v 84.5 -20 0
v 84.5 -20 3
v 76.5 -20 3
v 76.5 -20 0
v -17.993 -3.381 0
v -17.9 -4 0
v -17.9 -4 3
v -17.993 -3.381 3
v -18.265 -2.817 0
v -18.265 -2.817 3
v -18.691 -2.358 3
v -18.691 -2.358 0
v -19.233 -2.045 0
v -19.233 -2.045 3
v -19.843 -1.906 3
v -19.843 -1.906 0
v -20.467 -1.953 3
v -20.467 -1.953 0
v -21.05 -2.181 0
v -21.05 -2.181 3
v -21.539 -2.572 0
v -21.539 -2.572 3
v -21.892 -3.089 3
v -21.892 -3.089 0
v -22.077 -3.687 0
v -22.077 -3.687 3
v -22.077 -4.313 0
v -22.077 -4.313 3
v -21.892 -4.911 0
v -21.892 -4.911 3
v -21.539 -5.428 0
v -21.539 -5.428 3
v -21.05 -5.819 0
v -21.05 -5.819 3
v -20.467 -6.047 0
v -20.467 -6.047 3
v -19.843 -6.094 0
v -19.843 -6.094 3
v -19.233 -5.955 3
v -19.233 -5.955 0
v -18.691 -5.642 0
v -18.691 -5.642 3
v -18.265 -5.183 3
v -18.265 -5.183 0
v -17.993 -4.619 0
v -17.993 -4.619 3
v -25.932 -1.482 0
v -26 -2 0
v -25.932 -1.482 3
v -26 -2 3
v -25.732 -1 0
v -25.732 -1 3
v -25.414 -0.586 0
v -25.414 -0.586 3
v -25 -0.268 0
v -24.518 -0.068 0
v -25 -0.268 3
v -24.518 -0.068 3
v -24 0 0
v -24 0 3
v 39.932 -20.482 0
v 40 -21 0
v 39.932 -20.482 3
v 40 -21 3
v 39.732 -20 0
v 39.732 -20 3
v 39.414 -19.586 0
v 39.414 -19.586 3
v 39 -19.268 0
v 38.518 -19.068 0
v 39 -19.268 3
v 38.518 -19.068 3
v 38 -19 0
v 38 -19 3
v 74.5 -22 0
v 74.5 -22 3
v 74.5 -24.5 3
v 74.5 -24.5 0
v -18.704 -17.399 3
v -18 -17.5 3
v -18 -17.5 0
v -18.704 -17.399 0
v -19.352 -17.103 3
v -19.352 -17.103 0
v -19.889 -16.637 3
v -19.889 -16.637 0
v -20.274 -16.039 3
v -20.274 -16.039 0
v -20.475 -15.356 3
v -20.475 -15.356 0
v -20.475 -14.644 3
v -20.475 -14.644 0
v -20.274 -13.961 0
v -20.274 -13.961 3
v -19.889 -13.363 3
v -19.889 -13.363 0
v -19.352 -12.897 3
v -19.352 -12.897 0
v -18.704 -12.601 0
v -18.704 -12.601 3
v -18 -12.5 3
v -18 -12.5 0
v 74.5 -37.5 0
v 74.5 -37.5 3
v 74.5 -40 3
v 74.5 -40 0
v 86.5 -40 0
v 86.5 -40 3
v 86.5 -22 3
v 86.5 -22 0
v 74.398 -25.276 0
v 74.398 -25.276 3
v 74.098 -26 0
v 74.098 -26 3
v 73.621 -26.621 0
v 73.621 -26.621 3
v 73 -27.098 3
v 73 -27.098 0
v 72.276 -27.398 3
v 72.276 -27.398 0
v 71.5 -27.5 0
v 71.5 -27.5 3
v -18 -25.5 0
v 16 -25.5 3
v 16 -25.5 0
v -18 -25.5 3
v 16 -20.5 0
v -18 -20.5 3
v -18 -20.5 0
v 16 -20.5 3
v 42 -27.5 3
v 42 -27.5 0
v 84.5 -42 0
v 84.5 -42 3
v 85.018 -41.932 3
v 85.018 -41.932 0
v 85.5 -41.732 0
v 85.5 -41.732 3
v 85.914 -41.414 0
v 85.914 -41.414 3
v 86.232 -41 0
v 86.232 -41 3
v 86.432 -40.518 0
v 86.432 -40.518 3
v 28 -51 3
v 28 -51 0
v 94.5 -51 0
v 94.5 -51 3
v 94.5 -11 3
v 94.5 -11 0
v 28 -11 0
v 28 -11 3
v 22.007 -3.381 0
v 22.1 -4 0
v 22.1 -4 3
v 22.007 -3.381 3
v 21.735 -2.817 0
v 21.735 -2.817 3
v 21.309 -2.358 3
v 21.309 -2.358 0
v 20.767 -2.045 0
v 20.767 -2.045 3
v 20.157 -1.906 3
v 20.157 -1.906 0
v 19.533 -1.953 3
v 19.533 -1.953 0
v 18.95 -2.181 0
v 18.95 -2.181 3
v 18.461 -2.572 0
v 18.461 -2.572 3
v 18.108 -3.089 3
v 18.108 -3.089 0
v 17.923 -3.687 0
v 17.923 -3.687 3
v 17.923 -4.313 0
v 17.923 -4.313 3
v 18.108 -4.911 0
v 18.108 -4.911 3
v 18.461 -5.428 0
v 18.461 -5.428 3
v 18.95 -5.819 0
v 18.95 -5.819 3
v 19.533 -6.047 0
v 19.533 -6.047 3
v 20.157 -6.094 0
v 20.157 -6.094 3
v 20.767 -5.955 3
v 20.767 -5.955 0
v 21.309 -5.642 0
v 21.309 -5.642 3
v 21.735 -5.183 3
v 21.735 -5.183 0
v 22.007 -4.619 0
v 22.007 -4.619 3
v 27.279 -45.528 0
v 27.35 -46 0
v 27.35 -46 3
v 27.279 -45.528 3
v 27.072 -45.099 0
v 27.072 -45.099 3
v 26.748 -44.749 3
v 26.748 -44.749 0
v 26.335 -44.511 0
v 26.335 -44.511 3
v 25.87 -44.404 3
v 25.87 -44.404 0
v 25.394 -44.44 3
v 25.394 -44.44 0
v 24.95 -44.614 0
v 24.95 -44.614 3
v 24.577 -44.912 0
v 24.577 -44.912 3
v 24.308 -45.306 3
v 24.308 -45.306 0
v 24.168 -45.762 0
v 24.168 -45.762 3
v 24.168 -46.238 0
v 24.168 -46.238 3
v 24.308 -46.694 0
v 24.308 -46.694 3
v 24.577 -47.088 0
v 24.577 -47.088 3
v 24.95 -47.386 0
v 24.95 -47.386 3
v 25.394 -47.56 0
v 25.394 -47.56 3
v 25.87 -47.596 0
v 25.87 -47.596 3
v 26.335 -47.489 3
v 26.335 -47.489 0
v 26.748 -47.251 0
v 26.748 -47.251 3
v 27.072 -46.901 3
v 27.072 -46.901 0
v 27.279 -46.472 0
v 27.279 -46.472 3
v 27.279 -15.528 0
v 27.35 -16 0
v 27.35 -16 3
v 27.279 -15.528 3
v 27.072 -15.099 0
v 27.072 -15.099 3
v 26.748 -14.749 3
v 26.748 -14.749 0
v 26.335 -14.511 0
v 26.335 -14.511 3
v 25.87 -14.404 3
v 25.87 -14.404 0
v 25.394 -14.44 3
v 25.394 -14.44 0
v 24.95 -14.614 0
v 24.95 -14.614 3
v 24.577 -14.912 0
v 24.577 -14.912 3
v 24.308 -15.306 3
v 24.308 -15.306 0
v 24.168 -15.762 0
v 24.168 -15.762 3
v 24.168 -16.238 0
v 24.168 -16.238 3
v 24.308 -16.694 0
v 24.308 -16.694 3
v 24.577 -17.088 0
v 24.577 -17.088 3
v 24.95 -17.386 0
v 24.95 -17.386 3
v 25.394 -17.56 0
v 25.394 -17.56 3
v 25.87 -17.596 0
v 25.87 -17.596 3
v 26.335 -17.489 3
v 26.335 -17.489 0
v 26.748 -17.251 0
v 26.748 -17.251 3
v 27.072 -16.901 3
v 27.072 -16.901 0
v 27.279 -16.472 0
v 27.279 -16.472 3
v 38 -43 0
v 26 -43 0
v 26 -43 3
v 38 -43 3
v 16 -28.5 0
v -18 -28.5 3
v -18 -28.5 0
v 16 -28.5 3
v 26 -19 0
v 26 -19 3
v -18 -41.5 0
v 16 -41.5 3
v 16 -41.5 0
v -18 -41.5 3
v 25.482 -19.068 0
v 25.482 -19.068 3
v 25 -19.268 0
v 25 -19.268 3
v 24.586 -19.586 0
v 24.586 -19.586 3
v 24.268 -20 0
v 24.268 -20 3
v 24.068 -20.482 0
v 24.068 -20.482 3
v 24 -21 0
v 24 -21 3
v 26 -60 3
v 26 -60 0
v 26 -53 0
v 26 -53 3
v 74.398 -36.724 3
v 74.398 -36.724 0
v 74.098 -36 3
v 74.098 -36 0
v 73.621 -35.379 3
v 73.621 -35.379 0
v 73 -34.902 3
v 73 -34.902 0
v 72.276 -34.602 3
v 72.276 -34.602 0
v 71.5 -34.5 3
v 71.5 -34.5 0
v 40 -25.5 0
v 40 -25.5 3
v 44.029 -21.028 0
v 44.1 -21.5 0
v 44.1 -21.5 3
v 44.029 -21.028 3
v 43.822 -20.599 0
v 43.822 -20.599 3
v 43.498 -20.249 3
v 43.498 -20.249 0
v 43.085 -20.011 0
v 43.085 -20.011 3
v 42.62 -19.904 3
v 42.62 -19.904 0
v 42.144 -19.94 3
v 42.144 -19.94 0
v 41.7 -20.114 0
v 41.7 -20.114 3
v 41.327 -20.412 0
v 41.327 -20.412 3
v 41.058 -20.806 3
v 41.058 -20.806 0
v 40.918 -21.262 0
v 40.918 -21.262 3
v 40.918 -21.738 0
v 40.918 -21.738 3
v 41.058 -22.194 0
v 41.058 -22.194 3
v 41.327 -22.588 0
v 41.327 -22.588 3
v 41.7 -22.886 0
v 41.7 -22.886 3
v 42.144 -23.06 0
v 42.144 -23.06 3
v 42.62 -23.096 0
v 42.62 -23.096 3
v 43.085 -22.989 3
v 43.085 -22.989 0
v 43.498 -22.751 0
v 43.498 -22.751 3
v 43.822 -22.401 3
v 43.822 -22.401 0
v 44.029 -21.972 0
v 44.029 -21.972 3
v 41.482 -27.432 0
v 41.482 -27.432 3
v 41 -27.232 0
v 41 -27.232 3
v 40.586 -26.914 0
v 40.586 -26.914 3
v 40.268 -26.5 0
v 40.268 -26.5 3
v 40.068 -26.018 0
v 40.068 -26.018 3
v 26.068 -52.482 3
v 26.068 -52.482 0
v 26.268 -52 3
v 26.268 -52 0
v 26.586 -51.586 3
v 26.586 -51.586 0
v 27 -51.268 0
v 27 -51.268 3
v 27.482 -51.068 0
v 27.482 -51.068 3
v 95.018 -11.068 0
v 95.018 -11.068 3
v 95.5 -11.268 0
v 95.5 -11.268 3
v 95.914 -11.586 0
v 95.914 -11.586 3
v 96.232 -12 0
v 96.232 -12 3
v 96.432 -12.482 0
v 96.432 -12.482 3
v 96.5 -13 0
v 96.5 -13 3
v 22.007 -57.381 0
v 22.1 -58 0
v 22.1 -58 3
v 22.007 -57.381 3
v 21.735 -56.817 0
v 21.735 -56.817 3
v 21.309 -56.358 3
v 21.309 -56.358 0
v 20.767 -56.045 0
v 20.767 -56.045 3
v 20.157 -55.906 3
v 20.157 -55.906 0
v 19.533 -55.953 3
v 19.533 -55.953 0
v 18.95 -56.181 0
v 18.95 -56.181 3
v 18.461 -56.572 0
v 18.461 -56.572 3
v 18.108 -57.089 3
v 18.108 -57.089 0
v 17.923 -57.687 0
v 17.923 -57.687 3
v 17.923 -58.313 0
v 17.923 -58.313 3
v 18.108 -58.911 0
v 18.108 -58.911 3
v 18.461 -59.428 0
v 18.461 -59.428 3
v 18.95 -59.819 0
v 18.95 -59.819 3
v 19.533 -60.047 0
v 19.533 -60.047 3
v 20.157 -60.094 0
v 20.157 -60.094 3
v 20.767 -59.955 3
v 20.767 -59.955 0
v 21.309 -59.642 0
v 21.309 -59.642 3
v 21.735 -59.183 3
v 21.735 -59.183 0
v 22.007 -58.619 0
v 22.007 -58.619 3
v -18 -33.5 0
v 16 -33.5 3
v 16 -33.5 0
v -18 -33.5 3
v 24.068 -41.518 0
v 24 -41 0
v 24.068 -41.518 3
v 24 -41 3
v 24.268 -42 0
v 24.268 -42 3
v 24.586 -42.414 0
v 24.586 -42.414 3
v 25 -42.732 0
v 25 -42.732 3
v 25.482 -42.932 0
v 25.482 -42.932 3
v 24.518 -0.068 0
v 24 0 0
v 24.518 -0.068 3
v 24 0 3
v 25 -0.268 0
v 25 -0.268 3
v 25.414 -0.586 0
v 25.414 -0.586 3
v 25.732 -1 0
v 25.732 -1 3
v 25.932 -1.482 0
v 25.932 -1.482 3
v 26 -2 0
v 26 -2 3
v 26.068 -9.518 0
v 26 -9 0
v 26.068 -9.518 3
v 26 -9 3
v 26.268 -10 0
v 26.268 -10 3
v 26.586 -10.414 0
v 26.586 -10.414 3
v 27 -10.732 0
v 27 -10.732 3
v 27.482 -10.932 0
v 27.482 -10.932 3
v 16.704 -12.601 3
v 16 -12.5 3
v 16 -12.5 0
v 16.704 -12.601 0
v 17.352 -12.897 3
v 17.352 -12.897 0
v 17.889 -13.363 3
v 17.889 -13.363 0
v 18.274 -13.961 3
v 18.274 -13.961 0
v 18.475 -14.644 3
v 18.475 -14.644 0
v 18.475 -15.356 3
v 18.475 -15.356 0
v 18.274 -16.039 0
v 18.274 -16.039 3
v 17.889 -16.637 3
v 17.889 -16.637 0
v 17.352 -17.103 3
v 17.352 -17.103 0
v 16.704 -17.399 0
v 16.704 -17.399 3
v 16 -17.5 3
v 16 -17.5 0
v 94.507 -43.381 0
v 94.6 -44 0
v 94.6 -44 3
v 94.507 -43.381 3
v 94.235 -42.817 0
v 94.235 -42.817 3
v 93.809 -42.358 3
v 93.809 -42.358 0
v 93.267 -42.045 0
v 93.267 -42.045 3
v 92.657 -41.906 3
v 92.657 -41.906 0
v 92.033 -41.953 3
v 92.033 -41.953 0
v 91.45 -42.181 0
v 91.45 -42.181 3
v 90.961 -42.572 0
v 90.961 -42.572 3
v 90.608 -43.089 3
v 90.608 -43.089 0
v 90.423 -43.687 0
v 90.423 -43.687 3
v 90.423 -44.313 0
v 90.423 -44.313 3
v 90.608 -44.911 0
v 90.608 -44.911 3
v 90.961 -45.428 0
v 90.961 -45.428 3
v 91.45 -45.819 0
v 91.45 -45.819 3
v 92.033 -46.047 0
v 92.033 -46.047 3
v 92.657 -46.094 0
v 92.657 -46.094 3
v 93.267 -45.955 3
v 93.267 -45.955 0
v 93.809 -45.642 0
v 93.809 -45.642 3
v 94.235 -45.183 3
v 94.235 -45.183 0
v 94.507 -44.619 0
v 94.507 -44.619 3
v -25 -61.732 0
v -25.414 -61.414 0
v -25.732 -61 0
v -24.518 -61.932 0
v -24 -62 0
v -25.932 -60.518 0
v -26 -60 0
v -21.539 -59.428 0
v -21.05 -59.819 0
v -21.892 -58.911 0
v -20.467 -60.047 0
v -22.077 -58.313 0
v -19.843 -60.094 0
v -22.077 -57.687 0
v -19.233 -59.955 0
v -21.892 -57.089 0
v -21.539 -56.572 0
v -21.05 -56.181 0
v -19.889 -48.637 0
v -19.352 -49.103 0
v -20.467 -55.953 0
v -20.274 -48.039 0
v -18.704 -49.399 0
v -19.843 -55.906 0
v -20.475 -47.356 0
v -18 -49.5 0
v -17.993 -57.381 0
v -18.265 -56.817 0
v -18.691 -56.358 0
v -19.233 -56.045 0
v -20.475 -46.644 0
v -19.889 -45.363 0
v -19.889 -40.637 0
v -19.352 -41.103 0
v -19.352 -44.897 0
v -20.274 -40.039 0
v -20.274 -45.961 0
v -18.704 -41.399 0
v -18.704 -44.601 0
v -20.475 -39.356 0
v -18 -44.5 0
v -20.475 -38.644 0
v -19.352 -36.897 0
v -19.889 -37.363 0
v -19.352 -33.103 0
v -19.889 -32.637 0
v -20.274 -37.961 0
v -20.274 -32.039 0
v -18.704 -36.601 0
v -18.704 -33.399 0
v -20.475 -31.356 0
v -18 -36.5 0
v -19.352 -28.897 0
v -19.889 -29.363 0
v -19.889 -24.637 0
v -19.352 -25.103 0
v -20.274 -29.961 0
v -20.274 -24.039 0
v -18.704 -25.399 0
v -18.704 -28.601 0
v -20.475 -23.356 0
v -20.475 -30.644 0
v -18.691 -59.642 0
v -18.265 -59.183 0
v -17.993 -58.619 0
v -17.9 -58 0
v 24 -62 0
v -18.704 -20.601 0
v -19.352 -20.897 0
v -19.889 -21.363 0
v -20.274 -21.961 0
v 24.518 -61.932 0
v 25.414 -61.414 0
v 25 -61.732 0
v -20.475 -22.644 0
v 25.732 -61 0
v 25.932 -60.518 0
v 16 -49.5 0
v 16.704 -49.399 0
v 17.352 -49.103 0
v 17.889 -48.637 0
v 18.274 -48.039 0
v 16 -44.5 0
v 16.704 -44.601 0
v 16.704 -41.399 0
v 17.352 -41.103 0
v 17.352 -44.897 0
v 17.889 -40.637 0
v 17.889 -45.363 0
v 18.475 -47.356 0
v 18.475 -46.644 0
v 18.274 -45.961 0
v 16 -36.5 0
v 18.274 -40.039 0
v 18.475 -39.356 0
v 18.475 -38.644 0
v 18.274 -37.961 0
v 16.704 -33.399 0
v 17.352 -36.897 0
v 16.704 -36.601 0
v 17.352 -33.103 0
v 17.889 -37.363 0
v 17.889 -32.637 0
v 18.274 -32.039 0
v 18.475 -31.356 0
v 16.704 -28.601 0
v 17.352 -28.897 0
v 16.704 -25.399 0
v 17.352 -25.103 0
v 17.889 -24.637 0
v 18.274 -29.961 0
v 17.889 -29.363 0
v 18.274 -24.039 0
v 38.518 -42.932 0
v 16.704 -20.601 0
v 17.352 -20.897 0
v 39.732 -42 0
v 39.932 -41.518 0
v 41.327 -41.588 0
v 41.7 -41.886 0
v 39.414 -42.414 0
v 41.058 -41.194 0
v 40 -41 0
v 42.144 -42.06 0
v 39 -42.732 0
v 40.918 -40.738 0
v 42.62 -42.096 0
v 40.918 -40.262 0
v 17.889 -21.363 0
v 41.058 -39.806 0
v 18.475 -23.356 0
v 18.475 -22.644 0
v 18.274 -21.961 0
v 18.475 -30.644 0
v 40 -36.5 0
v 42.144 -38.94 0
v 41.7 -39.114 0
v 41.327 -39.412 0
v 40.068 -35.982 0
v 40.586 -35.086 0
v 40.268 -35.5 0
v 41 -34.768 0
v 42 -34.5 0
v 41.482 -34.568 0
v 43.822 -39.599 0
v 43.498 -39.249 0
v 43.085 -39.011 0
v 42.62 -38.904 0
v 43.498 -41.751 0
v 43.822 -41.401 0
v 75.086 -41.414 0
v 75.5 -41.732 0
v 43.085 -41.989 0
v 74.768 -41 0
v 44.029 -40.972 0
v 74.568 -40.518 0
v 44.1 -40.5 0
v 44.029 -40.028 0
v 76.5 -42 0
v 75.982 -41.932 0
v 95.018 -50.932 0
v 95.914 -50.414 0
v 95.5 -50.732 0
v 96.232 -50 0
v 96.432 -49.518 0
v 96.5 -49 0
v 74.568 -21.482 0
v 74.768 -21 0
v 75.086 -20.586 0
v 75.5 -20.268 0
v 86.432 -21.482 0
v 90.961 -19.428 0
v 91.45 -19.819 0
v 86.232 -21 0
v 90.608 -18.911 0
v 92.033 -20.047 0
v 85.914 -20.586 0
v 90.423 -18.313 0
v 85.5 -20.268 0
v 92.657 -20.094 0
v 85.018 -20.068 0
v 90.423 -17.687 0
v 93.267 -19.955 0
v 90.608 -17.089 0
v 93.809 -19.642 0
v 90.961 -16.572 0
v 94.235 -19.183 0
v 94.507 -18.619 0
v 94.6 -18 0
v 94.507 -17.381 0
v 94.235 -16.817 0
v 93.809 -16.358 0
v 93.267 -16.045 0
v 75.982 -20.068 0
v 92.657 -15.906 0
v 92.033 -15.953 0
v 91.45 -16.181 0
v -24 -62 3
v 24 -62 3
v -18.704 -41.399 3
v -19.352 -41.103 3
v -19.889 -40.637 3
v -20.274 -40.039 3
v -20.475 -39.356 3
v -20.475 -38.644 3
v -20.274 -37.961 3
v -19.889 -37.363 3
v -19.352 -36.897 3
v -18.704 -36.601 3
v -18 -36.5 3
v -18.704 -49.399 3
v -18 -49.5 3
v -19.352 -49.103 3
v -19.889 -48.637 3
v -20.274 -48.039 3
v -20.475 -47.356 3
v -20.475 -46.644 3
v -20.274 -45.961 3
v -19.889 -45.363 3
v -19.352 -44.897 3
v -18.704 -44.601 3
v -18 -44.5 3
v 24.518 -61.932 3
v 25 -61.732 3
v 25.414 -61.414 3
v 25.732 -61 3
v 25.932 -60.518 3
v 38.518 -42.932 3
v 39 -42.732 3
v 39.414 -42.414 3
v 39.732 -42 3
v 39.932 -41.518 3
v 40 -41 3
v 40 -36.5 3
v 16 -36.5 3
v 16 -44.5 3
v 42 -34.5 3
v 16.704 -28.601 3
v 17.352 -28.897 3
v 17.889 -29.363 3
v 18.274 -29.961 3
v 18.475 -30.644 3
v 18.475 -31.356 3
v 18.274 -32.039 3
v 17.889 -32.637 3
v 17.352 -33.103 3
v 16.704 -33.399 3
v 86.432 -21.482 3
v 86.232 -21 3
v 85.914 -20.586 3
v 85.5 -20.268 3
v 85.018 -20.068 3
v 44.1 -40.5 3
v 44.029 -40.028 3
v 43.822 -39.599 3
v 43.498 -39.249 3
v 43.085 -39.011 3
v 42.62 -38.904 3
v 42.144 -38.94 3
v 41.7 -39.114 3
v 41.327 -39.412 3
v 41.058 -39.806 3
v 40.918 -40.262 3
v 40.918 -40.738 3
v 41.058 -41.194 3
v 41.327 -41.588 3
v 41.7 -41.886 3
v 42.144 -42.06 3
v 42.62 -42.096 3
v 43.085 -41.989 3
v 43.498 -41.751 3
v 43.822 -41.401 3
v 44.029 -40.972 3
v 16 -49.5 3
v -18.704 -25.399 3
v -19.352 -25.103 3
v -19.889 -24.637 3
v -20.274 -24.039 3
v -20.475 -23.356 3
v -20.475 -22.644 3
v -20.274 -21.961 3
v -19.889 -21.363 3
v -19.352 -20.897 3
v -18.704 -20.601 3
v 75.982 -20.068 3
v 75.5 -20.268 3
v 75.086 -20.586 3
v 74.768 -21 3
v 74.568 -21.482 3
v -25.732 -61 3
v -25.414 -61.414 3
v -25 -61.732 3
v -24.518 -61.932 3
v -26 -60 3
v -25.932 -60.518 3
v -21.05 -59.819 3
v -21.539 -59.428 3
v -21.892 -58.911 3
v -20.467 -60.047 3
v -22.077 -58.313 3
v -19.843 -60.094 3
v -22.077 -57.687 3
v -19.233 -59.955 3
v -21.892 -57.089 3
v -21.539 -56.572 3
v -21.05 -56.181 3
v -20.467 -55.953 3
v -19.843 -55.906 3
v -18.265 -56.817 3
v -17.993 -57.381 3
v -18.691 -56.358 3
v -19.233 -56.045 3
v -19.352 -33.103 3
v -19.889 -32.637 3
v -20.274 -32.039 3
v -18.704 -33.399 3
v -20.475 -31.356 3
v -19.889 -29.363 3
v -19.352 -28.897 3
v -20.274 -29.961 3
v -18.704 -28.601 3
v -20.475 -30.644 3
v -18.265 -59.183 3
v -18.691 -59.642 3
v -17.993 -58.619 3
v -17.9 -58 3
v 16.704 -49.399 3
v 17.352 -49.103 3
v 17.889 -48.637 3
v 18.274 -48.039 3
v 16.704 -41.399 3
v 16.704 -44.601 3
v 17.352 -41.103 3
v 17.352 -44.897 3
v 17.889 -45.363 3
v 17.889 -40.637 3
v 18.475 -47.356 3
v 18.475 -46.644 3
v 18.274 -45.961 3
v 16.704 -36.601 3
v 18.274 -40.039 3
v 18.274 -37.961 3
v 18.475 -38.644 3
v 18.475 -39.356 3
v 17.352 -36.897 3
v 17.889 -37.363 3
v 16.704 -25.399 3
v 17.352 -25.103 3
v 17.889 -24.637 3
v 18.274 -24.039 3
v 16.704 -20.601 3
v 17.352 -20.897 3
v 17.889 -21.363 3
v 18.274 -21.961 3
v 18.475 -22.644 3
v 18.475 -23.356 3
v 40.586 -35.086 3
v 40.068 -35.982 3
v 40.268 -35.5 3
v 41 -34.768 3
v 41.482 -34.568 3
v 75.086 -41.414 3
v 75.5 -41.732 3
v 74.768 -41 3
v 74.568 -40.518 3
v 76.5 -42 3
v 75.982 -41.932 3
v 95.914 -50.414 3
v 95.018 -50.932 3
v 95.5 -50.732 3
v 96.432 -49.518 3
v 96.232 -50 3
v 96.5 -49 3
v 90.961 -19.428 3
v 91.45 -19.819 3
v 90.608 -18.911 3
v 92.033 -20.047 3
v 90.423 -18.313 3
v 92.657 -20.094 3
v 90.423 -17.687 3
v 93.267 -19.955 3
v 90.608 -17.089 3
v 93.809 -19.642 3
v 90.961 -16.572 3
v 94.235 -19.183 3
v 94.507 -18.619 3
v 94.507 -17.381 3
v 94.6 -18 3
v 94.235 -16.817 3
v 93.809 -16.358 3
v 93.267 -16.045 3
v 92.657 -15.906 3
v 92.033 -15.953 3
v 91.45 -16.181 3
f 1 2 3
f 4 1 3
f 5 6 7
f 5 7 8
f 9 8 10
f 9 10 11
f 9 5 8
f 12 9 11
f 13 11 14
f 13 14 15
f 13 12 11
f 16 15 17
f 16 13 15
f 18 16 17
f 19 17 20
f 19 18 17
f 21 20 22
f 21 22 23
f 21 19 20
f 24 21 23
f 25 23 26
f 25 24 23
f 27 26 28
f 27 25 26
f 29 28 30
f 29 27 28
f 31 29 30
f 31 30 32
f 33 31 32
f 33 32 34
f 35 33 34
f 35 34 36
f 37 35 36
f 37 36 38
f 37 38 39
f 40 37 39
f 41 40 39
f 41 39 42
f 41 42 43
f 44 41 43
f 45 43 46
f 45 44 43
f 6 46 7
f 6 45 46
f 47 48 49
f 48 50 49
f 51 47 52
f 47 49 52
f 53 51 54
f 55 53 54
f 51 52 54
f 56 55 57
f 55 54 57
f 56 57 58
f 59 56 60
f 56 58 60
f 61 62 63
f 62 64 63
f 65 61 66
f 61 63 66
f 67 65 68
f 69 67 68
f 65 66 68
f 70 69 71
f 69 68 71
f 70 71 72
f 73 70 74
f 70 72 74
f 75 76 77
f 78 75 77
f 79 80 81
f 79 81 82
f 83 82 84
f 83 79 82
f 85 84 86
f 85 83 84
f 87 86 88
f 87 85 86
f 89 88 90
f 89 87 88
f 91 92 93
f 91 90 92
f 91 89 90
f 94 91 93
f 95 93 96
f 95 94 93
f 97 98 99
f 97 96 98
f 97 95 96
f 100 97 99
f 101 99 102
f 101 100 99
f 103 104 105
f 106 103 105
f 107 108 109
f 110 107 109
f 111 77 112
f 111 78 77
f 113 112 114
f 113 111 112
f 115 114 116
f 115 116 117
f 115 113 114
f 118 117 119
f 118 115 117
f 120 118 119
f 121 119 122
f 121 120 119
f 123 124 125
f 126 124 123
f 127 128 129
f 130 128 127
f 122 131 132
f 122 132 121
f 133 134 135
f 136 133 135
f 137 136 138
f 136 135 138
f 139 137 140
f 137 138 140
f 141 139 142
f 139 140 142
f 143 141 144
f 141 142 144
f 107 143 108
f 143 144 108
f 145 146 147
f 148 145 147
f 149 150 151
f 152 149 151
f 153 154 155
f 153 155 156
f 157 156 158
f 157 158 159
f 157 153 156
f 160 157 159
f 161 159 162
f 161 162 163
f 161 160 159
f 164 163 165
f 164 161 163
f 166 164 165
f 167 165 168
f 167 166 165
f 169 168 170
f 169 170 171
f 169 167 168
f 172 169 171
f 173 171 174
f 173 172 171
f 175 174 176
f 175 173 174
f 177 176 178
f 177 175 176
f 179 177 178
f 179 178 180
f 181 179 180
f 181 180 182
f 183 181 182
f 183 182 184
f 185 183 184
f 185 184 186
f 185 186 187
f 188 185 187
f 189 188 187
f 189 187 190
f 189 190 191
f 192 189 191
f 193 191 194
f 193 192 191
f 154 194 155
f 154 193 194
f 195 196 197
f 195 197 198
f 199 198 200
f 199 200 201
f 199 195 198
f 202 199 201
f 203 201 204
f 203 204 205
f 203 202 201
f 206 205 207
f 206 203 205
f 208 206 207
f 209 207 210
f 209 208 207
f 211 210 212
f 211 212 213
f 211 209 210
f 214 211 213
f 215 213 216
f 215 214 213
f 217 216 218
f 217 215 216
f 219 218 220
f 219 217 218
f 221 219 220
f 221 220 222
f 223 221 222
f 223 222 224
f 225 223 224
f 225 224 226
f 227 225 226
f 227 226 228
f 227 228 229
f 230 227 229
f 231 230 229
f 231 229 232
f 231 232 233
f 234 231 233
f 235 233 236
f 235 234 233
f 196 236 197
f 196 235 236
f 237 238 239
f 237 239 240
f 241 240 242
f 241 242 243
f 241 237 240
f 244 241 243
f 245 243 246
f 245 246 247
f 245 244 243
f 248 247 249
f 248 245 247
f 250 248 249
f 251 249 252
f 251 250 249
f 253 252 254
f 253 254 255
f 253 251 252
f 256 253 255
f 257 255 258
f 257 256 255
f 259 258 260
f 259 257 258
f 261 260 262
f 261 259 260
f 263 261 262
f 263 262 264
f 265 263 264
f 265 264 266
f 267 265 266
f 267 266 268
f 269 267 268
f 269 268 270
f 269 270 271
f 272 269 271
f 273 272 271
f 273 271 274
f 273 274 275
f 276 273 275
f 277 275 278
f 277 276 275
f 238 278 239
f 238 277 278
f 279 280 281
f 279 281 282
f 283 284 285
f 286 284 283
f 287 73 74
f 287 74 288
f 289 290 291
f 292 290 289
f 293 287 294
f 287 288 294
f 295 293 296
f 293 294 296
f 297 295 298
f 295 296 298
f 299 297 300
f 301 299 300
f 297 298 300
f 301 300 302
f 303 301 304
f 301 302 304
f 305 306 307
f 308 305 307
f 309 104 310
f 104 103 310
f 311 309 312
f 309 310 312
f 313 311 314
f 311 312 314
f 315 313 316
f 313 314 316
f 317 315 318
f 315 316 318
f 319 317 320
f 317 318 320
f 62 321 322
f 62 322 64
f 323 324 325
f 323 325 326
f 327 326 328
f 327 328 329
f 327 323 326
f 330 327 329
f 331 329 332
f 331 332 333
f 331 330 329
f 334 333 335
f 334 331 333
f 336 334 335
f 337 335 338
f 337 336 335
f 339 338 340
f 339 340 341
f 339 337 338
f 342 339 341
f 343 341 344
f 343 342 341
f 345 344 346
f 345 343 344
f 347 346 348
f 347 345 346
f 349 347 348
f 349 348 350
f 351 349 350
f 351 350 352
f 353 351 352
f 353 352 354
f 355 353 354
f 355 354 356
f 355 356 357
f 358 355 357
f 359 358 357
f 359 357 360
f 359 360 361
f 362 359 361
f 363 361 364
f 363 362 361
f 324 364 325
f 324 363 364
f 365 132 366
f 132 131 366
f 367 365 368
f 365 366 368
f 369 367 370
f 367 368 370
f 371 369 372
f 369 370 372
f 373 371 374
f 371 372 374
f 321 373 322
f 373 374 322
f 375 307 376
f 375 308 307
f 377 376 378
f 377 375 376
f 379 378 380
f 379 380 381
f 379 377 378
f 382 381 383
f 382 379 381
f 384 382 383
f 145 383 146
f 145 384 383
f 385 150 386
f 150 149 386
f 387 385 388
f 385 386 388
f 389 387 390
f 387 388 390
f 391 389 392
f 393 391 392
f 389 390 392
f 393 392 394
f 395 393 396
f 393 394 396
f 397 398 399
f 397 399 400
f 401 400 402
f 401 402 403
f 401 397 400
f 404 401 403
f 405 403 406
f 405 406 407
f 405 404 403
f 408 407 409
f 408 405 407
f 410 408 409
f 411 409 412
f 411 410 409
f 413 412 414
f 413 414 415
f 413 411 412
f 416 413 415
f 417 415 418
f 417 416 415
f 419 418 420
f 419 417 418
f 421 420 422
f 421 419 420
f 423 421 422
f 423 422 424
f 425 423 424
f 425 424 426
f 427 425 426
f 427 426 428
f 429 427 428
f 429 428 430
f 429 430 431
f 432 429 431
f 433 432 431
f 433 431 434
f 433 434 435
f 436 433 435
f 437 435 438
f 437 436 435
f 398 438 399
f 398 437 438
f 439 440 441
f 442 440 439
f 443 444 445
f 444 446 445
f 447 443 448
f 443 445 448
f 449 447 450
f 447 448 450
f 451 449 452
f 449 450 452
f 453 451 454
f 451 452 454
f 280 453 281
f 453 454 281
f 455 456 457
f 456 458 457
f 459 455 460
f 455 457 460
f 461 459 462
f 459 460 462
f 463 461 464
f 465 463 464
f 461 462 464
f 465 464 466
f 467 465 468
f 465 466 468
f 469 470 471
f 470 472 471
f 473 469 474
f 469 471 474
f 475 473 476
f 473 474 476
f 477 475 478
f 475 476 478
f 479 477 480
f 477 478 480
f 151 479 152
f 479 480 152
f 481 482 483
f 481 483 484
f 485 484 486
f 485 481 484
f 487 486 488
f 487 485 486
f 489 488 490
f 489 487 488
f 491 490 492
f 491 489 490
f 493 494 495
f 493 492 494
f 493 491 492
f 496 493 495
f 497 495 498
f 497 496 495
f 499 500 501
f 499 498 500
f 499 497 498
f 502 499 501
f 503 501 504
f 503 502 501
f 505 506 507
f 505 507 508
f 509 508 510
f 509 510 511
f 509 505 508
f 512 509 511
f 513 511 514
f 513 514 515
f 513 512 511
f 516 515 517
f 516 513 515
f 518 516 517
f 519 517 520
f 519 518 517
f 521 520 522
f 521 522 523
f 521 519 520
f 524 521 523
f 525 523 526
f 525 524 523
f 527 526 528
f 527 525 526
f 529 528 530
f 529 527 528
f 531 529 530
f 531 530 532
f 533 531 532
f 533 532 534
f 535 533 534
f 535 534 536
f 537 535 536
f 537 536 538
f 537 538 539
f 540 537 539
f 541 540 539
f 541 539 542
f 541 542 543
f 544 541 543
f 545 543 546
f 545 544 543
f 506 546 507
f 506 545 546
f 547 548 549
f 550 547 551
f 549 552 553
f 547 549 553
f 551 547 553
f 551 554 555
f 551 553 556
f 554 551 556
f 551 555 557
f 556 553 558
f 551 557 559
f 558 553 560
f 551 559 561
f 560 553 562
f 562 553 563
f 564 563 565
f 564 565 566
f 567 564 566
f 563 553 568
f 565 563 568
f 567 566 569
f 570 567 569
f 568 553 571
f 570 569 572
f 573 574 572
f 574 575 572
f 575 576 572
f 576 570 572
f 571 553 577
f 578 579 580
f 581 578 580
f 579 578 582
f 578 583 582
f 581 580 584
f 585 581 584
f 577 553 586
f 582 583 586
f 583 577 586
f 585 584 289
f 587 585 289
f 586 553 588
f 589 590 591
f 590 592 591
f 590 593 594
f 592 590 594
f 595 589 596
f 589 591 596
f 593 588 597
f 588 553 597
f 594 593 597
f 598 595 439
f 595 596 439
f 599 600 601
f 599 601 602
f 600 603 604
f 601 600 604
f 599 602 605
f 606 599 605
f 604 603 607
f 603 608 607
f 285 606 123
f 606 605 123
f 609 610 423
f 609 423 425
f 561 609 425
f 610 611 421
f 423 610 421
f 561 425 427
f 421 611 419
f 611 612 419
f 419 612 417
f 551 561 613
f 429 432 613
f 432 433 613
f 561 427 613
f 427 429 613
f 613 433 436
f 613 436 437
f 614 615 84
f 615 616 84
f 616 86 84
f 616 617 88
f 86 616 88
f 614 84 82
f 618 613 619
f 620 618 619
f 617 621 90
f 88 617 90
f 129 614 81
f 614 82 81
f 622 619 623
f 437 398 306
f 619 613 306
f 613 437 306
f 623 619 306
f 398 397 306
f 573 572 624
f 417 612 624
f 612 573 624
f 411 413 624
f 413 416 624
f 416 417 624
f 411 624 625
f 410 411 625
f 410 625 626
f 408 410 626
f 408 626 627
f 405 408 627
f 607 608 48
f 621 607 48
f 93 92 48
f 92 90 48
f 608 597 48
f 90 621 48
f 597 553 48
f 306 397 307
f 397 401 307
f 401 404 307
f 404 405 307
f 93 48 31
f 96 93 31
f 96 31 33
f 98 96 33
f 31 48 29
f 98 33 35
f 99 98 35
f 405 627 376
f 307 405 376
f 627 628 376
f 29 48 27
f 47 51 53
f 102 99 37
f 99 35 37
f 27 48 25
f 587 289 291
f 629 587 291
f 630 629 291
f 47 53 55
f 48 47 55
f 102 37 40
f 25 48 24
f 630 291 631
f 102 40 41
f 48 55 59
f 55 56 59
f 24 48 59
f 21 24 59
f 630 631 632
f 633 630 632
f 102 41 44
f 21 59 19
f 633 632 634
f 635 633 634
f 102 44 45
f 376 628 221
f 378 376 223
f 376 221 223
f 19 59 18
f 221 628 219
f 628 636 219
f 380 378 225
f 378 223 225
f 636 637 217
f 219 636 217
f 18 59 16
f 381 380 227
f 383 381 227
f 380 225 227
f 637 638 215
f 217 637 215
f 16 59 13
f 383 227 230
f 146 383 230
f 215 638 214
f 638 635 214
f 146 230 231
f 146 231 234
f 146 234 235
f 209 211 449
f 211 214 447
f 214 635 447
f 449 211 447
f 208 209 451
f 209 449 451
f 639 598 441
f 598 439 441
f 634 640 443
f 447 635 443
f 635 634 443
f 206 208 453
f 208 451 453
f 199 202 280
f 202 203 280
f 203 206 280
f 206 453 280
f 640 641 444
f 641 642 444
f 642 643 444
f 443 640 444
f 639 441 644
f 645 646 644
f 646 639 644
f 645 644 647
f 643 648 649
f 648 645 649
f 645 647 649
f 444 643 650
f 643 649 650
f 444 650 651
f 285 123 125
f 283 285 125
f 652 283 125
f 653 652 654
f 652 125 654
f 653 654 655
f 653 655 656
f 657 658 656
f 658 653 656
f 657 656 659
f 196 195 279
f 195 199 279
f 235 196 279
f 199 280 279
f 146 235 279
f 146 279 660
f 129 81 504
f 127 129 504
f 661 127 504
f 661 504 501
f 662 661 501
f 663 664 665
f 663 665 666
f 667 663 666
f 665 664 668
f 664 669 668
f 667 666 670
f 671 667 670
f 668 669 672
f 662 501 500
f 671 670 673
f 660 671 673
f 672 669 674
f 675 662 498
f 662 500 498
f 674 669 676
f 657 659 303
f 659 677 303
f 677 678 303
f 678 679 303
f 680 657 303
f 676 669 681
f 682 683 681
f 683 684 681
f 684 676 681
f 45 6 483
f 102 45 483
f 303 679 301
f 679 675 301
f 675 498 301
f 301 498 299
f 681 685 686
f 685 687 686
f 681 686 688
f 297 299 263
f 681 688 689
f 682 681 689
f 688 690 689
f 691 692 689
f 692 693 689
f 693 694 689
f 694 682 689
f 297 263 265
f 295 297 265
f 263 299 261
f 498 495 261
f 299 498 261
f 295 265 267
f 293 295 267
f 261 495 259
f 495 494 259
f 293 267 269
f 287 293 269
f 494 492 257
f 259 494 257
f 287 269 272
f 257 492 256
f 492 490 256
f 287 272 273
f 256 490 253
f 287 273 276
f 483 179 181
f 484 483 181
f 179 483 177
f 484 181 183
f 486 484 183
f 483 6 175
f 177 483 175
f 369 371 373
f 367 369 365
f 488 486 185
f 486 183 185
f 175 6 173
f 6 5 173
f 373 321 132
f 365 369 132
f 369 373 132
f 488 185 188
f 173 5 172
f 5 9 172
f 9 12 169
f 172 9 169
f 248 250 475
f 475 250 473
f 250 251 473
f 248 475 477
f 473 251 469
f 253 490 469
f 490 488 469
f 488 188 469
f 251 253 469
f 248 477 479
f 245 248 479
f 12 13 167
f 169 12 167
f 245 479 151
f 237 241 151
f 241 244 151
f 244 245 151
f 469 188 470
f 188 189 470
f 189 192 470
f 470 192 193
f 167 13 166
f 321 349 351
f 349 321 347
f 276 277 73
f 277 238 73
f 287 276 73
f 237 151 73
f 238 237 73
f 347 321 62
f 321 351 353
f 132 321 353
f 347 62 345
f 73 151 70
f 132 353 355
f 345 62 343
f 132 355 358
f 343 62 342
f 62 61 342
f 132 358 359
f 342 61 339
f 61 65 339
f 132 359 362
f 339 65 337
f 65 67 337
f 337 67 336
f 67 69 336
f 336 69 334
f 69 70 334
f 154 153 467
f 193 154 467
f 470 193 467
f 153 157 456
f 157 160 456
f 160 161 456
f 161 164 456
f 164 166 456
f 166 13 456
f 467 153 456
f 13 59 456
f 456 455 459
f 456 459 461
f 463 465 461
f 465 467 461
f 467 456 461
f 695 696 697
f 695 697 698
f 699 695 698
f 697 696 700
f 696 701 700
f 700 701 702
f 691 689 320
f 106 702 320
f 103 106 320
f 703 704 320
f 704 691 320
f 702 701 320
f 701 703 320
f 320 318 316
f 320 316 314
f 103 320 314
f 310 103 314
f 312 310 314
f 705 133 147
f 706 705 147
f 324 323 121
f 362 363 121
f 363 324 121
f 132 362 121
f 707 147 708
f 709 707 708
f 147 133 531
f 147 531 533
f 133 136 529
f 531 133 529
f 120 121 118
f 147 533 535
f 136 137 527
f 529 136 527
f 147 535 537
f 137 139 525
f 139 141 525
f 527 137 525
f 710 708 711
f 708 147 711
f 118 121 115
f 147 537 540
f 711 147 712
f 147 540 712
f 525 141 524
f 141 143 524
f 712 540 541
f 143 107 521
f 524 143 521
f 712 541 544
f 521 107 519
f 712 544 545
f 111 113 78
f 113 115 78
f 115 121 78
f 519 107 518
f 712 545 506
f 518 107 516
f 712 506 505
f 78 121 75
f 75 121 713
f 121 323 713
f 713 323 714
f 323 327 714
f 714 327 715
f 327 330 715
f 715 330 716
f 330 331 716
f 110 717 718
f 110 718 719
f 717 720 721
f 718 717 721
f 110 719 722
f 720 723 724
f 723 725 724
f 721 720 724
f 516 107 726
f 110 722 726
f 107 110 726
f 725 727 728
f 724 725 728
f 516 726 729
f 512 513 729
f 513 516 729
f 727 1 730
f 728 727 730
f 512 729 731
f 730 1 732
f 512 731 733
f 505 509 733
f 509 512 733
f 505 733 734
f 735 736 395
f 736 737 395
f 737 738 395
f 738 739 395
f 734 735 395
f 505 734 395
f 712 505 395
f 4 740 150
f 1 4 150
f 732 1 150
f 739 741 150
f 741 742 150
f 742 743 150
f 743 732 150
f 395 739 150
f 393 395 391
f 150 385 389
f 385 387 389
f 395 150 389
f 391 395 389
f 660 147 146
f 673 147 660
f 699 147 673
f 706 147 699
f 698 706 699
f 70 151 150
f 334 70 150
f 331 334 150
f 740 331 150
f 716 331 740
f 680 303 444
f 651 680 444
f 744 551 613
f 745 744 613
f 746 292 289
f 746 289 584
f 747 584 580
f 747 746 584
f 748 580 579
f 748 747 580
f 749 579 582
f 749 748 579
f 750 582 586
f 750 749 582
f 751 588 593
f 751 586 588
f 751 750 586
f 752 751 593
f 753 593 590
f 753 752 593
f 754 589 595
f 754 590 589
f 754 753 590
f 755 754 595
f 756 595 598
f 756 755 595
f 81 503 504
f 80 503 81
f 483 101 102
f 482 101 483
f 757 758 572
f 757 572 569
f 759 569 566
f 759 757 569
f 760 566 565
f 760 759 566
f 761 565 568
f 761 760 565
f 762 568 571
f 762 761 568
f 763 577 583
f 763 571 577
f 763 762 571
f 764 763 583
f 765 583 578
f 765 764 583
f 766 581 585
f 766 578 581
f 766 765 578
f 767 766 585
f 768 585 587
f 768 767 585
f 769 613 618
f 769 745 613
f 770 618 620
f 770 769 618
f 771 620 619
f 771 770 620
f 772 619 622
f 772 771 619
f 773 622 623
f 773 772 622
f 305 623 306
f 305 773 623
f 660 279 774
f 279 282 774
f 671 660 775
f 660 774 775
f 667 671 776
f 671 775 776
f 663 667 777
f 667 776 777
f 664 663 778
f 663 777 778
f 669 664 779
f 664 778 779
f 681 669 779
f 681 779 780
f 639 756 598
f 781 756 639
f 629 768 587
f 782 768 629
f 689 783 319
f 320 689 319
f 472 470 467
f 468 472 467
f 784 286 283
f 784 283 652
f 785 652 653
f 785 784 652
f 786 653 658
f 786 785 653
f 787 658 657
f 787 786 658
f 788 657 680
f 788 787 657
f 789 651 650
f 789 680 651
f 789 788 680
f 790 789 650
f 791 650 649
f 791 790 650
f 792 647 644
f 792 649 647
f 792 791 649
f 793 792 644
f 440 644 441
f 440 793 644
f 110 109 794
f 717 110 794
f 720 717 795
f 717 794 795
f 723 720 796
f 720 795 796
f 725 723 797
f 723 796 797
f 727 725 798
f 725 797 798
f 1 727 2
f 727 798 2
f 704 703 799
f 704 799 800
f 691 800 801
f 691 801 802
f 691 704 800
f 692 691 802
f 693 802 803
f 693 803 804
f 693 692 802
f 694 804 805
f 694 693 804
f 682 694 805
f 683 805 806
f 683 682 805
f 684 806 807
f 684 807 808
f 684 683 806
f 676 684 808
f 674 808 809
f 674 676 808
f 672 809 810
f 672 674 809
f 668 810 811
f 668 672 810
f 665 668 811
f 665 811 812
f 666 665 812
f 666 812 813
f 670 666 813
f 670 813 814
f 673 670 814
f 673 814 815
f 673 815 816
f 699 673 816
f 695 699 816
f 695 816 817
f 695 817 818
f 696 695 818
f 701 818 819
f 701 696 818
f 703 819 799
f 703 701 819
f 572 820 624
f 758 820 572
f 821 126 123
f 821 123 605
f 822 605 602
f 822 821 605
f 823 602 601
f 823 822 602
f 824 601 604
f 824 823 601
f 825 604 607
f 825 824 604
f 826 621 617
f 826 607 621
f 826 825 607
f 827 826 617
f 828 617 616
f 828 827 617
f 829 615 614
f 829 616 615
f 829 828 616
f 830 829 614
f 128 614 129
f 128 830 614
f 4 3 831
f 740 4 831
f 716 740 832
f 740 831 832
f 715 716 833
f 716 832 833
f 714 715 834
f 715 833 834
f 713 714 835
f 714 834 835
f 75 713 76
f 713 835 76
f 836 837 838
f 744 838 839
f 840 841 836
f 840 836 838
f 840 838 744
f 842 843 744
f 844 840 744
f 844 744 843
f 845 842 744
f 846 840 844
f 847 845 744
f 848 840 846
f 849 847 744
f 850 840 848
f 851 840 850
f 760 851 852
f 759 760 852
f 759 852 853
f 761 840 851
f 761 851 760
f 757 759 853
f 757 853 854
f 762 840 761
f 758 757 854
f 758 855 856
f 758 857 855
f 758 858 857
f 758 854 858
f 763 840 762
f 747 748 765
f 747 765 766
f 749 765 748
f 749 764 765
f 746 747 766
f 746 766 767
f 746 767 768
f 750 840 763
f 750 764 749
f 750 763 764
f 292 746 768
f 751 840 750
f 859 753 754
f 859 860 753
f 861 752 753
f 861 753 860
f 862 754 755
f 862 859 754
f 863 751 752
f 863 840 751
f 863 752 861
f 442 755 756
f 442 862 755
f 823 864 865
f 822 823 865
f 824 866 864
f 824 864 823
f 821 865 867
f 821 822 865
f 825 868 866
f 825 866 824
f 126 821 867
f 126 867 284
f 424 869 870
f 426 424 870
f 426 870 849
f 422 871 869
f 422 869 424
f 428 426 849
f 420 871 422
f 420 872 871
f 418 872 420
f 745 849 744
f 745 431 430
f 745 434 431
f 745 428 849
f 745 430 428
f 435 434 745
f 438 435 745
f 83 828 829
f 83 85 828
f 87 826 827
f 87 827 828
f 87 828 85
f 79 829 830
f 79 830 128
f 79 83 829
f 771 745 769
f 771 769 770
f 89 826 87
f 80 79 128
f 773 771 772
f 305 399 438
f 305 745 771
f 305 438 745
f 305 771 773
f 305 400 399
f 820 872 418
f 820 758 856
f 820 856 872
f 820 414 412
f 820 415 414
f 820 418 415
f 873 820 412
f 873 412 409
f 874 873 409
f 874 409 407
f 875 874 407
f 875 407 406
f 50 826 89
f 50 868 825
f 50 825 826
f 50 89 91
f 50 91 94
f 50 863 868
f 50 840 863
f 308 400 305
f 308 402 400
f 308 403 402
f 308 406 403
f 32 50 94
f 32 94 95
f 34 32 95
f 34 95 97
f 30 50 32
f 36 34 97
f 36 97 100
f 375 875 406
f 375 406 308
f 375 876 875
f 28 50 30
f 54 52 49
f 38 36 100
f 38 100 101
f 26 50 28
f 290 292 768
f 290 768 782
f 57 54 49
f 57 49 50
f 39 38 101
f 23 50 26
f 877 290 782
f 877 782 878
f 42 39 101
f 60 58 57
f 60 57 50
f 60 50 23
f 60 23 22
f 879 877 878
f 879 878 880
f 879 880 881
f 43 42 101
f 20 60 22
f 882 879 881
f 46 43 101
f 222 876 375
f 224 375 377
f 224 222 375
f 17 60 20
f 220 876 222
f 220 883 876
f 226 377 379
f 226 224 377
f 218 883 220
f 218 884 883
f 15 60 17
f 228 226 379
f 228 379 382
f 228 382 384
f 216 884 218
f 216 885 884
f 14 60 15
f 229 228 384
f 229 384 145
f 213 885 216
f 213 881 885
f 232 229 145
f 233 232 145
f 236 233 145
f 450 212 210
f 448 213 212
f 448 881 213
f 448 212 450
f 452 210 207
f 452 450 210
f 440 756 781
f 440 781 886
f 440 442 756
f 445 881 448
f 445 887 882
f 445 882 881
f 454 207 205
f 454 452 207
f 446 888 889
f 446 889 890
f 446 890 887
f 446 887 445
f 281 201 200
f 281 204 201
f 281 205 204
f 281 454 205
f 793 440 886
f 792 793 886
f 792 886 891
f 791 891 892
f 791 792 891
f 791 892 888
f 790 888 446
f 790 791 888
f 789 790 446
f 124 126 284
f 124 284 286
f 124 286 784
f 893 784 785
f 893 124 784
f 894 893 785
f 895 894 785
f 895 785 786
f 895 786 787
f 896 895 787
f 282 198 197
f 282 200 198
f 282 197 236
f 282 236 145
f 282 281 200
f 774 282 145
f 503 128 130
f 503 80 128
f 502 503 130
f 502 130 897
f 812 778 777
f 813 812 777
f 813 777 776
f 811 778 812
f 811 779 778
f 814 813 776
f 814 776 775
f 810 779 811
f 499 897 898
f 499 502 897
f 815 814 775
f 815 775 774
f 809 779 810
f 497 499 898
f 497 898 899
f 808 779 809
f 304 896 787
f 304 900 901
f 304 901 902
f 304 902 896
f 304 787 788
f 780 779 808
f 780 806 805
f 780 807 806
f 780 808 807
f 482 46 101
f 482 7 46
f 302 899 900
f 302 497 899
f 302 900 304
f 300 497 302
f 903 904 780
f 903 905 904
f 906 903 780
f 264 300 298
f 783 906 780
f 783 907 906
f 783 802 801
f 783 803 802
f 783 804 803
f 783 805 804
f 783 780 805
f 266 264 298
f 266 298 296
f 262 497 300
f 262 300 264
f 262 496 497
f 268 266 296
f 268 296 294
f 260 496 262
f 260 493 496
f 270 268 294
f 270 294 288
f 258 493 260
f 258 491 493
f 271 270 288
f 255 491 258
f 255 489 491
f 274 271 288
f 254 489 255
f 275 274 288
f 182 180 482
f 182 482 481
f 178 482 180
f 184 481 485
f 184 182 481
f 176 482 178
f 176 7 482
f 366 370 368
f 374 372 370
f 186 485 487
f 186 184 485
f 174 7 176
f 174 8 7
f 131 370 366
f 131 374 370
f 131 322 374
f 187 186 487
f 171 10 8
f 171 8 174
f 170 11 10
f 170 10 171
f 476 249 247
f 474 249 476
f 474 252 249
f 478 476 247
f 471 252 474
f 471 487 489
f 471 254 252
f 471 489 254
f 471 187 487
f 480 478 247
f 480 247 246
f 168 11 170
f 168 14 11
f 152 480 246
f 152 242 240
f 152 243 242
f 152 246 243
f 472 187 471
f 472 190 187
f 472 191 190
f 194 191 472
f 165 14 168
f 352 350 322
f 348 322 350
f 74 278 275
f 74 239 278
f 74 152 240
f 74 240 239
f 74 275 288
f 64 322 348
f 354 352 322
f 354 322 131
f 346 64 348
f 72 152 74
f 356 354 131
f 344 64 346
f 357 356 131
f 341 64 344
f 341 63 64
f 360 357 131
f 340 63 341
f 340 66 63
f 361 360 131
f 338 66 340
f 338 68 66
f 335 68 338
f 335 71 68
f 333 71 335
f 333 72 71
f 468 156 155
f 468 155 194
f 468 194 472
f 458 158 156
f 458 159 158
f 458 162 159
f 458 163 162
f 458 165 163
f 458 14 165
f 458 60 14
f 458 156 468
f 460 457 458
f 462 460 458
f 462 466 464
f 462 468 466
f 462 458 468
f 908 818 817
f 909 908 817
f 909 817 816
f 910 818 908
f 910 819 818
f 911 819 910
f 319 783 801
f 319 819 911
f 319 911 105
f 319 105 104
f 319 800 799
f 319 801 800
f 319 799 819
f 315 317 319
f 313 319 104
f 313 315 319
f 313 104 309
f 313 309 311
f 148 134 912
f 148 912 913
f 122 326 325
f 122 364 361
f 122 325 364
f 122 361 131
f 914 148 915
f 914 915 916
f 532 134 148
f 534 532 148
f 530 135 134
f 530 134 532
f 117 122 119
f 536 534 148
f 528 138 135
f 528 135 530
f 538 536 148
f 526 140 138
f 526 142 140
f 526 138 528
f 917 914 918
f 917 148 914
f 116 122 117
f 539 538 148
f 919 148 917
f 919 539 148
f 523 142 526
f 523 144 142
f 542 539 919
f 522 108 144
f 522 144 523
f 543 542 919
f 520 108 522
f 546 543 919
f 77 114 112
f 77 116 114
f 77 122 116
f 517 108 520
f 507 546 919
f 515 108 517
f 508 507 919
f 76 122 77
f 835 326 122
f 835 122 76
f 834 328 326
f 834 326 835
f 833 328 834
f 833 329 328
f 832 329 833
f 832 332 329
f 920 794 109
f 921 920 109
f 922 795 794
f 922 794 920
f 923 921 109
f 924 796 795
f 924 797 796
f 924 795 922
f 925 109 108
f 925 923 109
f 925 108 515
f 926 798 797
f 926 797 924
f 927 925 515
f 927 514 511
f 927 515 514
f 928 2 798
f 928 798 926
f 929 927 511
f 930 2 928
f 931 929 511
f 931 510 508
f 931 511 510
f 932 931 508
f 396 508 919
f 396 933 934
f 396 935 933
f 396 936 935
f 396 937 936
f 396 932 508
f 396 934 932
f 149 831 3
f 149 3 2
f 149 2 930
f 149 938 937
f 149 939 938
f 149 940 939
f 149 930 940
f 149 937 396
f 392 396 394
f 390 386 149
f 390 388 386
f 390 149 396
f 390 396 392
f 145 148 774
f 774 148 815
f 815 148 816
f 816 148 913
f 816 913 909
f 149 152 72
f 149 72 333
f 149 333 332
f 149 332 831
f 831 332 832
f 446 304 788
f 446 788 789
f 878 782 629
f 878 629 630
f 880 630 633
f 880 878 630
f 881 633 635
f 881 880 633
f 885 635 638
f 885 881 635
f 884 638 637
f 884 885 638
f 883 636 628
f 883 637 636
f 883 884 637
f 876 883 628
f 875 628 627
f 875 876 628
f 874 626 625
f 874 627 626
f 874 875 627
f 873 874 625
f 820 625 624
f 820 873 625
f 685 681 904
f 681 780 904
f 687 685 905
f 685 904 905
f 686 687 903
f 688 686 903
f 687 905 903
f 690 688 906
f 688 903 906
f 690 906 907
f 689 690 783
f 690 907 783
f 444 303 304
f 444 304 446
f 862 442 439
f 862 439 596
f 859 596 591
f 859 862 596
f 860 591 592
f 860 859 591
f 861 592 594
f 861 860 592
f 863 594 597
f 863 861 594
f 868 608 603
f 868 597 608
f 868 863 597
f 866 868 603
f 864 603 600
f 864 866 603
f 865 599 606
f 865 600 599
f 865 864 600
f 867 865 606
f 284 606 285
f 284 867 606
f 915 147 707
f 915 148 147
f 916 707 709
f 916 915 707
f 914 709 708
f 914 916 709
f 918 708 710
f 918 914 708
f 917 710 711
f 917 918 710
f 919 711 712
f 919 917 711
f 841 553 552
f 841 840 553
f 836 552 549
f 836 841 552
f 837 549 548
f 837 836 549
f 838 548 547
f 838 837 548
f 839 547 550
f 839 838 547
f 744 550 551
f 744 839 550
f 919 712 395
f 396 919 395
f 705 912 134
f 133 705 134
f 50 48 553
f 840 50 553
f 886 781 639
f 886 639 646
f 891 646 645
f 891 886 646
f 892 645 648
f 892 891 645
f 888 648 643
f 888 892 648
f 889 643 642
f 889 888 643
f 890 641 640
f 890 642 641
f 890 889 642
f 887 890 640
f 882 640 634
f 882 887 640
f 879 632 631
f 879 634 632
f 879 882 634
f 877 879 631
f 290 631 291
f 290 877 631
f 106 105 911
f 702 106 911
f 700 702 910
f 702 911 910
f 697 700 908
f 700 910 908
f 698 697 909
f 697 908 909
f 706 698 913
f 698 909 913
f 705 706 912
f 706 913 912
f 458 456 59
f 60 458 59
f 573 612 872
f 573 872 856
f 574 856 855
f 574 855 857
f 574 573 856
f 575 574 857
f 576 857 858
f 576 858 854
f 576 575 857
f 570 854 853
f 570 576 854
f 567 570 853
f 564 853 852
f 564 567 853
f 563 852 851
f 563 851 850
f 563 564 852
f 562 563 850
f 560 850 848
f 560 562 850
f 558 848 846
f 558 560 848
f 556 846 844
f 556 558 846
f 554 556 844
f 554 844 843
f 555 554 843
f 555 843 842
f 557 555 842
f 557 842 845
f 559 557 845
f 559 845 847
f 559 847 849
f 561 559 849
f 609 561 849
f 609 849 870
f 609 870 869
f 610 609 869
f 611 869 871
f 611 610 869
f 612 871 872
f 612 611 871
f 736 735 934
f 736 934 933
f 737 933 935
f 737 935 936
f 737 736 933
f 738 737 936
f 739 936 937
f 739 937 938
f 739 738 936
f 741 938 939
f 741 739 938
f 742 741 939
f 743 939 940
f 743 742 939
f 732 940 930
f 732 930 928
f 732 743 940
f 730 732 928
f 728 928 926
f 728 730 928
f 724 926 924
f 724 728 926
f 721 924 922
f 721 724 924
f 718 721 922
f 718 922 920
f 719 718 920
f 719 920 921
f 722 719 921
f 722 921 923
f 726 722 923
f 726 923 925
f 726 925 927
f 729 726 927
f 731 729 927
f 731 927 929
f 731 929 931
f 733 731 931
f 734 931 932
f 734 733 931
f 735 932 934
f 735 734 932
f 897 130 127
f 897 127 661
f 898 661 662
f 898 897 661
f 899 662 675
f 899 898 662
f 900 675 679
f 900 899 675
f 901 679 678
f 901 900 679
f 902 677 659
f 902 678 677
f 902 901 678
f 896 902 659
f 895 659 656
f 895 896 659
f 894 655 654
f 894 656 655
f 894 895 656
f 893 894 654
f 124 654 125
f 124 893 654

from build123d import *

# Parameters (mm, degrees)
SKETCH_1_R          = 2.1
SKETCH_1_R_2        = 1.599999998
SKETCH_1_R_3        = 2.099999998
SKETCH_1_R_4        = 1.6
EXTRUDE_1_DEPTH     = 3
FILLET_1_R          = 2
CUT_EXTRUDE_1_DEPTH = 115.739923305
SKETCH_3_W          = 8.5
SKETCH_3_H          = 7
CUT_EXTRUDE_2_DEPTH = 115.739923305
FILLET_2_R          = 3


with BuildPart() as part:
    # 草图1 → 凸台-拉伸1 (new body)
    with BuildSketch(Plane.XY):
        Polygon((-26, 0), (-26, -62), (26, -62), (26, -51), (96.5, -51), (96.5, -11), (26, -11), (26, 0), align=None)
        with Locations((-20, -4)):
            Circle(SKETCH_1_R, mode=Mode.SUBTRACT)
        with Locations((20, -4)):
            Circle(SKETCH_1_R, mode=Mode.SUBTRACT)
        with Locations((-20, -58)):
            Circle(SKETCH_1_R, mode=Mode.SUBTRACT)
        with Locations((20, -58)):
            Circle(SKETCH_1_R, mode=Mode.SUBTRACT)
        with Locations((42.500000002, -21.5)):
            Circle(SKETCH_1_R_2, mode=Mode.SUBTRACT)
        with Locations((42.500000002, -40.5)):
            Circle(SKETCH_1_R_2, mode=Mode.SUBTRACT)
        with Locations((92.500000002, -18)):
            Circle(SKETCH_1_R_3, mode=Mode.SUBTRACT)
        with Locations((92.500000002, -44)):
            Circle(SKETCH_1_R_3, mode=Mode.SUBTRACT)
        with Locations((25.75, -46)):
            Circle(SKETCH_1_R_4, mode=Mode.SUBTRACT)
        with Locations((25.75, -16)):
            Circle(SKETCH_1_R_4, mode=Mode.SUBTRACT)
        Polygon((68, -34.5), (68, -27.5), (40, -27.5), (40, -19), (24, -19), (24, -43), (40, -43), (40, -34.5), align=None, mode=Mode.SUBTRACT)
    extrude(amount=EXTRUDE_1_DEPTH)

    # 圆角1
    fillet_1_edges = [part.edges().sort_by_distance(p)[0] for p in [
        (26, 0, 1.5),
        (26, -11, 1.5),
        (96.5, -11, 1.5),
        (96.5, -51, 1.5),
        (26, -51, 1.5),
        (26, -62, 1.5),
        (-26, -62, 1.5),
        (-26, 0, 1.5),
        (40, -43, 1.5),
        (40, -34.5, 1.5),
        (68, -34.5, 1.5),
        (68, -27.5, 1.5),
        (40, -27.5, 1.5),
        (40, -19, 1.5),
        (24, -19, 1.5),
        (24, -43, 1.5),
    ]]
    fillet(fillet_1_edges, radius=FILLET_1_R)

    # 草图2 → 切除-拉伸1 (cut, through all)
    with BuildSketch(Plane.XY.offset(3)):
        with BuildLine():
            Line((-18, -28.5), (16, -28.5))
            ThreePointArc((16, -28.5), (18.5, -31), (16, -33.5))
            Line((16, -33.5), (-18, -33.5))
            ThreePointArc((-18, -33.5), (-20.5, -31), (-18, -28.5))
        make_face()
        with BuildLine():
            Line((-18, -20.5), (16, -20.5))
            ThreePointArc((16, -20.5), (18.5, -23), (16, -25.5))
            Line((16, -25.5), (-18, -25.5))
            ThreePointArc((-18, -25.5), (-20.5, -23), (-18, -20.5))
        make_face()
        with BuildLine():
            Line((-18, -12.5), (16, -12.5))
            ThreePointArc((16, -12.5), (18.5, -15), (16, -17.5))
            Line((16, -17.5), (-18, -17.5))
            ThreePointArc((-18, -17.5), (-20.5, -15), (-18, -12.5))
        make_face()
        with BuildLine():
            Line((-18, -36.5), (16, -36.5))
            ThreePointArc((16, -36.5), (18.5, -39), (16, -41.5))
            Line((16, -41.5), (-18, -41.5))
            ThreePointArc((-18, -41.5), (-20.5, -39), (-18, -36.5))
        make_face()
        with BuildLine():
            Line((-18, -44.5), (16, -44.5))
            ThreePointArc((16, -44.5), (18.5, -47), (16, -49.5))
            Line((16, -49.5), (-18, -49.5))
            ThreePointArc((-18, -49.5), (-20.5, -47), (-18, -44.5))
        make_face()
        with BuildLine():
            Line((74.5, -22), (74.5, -40))
            ThreePointArc((74.5, -40), (75.085786438, -41.414213562), (76.5, -42))
            Line((76.5, -42), (84.5, -42))
            ThreePointArc((84.5, -42), (85.914213562, -41.414213562), (86.5, -40))
            Line((86.5, -40), (86.5, -22))
            ThreePointArc((86.5, -22), (85.914213562, -20.585786438), (84.5, -20))
            Line((84.5, -20), (76.5, -20))
            ThreePointArc((76.5, -20), (75.085786438, -20.585786438), (74.5, -22))
        make_face()
    extrude(amount=-CUT_EXTRUDE_1_DEPTH, mode=Mode.SUBTRACT)

    # 草图3 → 切除-拉伸2 (cut, through all)
    with BuildSketch(Plane.XY.offset(3)):
        with Locations((70.25, -31)):
            Rectangle(SKETCH_3_W, SKETCH_3_H)
    extrude(amount=-CUT_EXTRUDE_2_DEPTH, mode=Mode.SUBTRACT)

    # 圆角2
    fillet_2_edges = [part.edges().sort_by_distance(p)[0] for p in [
        (74.5, -27.5, 1.5),
        (74.5, -34.5, 1.5),
    ]]
    fillet(fillet_2_edges, radius=FILLET_2_R)


solid = part.part
